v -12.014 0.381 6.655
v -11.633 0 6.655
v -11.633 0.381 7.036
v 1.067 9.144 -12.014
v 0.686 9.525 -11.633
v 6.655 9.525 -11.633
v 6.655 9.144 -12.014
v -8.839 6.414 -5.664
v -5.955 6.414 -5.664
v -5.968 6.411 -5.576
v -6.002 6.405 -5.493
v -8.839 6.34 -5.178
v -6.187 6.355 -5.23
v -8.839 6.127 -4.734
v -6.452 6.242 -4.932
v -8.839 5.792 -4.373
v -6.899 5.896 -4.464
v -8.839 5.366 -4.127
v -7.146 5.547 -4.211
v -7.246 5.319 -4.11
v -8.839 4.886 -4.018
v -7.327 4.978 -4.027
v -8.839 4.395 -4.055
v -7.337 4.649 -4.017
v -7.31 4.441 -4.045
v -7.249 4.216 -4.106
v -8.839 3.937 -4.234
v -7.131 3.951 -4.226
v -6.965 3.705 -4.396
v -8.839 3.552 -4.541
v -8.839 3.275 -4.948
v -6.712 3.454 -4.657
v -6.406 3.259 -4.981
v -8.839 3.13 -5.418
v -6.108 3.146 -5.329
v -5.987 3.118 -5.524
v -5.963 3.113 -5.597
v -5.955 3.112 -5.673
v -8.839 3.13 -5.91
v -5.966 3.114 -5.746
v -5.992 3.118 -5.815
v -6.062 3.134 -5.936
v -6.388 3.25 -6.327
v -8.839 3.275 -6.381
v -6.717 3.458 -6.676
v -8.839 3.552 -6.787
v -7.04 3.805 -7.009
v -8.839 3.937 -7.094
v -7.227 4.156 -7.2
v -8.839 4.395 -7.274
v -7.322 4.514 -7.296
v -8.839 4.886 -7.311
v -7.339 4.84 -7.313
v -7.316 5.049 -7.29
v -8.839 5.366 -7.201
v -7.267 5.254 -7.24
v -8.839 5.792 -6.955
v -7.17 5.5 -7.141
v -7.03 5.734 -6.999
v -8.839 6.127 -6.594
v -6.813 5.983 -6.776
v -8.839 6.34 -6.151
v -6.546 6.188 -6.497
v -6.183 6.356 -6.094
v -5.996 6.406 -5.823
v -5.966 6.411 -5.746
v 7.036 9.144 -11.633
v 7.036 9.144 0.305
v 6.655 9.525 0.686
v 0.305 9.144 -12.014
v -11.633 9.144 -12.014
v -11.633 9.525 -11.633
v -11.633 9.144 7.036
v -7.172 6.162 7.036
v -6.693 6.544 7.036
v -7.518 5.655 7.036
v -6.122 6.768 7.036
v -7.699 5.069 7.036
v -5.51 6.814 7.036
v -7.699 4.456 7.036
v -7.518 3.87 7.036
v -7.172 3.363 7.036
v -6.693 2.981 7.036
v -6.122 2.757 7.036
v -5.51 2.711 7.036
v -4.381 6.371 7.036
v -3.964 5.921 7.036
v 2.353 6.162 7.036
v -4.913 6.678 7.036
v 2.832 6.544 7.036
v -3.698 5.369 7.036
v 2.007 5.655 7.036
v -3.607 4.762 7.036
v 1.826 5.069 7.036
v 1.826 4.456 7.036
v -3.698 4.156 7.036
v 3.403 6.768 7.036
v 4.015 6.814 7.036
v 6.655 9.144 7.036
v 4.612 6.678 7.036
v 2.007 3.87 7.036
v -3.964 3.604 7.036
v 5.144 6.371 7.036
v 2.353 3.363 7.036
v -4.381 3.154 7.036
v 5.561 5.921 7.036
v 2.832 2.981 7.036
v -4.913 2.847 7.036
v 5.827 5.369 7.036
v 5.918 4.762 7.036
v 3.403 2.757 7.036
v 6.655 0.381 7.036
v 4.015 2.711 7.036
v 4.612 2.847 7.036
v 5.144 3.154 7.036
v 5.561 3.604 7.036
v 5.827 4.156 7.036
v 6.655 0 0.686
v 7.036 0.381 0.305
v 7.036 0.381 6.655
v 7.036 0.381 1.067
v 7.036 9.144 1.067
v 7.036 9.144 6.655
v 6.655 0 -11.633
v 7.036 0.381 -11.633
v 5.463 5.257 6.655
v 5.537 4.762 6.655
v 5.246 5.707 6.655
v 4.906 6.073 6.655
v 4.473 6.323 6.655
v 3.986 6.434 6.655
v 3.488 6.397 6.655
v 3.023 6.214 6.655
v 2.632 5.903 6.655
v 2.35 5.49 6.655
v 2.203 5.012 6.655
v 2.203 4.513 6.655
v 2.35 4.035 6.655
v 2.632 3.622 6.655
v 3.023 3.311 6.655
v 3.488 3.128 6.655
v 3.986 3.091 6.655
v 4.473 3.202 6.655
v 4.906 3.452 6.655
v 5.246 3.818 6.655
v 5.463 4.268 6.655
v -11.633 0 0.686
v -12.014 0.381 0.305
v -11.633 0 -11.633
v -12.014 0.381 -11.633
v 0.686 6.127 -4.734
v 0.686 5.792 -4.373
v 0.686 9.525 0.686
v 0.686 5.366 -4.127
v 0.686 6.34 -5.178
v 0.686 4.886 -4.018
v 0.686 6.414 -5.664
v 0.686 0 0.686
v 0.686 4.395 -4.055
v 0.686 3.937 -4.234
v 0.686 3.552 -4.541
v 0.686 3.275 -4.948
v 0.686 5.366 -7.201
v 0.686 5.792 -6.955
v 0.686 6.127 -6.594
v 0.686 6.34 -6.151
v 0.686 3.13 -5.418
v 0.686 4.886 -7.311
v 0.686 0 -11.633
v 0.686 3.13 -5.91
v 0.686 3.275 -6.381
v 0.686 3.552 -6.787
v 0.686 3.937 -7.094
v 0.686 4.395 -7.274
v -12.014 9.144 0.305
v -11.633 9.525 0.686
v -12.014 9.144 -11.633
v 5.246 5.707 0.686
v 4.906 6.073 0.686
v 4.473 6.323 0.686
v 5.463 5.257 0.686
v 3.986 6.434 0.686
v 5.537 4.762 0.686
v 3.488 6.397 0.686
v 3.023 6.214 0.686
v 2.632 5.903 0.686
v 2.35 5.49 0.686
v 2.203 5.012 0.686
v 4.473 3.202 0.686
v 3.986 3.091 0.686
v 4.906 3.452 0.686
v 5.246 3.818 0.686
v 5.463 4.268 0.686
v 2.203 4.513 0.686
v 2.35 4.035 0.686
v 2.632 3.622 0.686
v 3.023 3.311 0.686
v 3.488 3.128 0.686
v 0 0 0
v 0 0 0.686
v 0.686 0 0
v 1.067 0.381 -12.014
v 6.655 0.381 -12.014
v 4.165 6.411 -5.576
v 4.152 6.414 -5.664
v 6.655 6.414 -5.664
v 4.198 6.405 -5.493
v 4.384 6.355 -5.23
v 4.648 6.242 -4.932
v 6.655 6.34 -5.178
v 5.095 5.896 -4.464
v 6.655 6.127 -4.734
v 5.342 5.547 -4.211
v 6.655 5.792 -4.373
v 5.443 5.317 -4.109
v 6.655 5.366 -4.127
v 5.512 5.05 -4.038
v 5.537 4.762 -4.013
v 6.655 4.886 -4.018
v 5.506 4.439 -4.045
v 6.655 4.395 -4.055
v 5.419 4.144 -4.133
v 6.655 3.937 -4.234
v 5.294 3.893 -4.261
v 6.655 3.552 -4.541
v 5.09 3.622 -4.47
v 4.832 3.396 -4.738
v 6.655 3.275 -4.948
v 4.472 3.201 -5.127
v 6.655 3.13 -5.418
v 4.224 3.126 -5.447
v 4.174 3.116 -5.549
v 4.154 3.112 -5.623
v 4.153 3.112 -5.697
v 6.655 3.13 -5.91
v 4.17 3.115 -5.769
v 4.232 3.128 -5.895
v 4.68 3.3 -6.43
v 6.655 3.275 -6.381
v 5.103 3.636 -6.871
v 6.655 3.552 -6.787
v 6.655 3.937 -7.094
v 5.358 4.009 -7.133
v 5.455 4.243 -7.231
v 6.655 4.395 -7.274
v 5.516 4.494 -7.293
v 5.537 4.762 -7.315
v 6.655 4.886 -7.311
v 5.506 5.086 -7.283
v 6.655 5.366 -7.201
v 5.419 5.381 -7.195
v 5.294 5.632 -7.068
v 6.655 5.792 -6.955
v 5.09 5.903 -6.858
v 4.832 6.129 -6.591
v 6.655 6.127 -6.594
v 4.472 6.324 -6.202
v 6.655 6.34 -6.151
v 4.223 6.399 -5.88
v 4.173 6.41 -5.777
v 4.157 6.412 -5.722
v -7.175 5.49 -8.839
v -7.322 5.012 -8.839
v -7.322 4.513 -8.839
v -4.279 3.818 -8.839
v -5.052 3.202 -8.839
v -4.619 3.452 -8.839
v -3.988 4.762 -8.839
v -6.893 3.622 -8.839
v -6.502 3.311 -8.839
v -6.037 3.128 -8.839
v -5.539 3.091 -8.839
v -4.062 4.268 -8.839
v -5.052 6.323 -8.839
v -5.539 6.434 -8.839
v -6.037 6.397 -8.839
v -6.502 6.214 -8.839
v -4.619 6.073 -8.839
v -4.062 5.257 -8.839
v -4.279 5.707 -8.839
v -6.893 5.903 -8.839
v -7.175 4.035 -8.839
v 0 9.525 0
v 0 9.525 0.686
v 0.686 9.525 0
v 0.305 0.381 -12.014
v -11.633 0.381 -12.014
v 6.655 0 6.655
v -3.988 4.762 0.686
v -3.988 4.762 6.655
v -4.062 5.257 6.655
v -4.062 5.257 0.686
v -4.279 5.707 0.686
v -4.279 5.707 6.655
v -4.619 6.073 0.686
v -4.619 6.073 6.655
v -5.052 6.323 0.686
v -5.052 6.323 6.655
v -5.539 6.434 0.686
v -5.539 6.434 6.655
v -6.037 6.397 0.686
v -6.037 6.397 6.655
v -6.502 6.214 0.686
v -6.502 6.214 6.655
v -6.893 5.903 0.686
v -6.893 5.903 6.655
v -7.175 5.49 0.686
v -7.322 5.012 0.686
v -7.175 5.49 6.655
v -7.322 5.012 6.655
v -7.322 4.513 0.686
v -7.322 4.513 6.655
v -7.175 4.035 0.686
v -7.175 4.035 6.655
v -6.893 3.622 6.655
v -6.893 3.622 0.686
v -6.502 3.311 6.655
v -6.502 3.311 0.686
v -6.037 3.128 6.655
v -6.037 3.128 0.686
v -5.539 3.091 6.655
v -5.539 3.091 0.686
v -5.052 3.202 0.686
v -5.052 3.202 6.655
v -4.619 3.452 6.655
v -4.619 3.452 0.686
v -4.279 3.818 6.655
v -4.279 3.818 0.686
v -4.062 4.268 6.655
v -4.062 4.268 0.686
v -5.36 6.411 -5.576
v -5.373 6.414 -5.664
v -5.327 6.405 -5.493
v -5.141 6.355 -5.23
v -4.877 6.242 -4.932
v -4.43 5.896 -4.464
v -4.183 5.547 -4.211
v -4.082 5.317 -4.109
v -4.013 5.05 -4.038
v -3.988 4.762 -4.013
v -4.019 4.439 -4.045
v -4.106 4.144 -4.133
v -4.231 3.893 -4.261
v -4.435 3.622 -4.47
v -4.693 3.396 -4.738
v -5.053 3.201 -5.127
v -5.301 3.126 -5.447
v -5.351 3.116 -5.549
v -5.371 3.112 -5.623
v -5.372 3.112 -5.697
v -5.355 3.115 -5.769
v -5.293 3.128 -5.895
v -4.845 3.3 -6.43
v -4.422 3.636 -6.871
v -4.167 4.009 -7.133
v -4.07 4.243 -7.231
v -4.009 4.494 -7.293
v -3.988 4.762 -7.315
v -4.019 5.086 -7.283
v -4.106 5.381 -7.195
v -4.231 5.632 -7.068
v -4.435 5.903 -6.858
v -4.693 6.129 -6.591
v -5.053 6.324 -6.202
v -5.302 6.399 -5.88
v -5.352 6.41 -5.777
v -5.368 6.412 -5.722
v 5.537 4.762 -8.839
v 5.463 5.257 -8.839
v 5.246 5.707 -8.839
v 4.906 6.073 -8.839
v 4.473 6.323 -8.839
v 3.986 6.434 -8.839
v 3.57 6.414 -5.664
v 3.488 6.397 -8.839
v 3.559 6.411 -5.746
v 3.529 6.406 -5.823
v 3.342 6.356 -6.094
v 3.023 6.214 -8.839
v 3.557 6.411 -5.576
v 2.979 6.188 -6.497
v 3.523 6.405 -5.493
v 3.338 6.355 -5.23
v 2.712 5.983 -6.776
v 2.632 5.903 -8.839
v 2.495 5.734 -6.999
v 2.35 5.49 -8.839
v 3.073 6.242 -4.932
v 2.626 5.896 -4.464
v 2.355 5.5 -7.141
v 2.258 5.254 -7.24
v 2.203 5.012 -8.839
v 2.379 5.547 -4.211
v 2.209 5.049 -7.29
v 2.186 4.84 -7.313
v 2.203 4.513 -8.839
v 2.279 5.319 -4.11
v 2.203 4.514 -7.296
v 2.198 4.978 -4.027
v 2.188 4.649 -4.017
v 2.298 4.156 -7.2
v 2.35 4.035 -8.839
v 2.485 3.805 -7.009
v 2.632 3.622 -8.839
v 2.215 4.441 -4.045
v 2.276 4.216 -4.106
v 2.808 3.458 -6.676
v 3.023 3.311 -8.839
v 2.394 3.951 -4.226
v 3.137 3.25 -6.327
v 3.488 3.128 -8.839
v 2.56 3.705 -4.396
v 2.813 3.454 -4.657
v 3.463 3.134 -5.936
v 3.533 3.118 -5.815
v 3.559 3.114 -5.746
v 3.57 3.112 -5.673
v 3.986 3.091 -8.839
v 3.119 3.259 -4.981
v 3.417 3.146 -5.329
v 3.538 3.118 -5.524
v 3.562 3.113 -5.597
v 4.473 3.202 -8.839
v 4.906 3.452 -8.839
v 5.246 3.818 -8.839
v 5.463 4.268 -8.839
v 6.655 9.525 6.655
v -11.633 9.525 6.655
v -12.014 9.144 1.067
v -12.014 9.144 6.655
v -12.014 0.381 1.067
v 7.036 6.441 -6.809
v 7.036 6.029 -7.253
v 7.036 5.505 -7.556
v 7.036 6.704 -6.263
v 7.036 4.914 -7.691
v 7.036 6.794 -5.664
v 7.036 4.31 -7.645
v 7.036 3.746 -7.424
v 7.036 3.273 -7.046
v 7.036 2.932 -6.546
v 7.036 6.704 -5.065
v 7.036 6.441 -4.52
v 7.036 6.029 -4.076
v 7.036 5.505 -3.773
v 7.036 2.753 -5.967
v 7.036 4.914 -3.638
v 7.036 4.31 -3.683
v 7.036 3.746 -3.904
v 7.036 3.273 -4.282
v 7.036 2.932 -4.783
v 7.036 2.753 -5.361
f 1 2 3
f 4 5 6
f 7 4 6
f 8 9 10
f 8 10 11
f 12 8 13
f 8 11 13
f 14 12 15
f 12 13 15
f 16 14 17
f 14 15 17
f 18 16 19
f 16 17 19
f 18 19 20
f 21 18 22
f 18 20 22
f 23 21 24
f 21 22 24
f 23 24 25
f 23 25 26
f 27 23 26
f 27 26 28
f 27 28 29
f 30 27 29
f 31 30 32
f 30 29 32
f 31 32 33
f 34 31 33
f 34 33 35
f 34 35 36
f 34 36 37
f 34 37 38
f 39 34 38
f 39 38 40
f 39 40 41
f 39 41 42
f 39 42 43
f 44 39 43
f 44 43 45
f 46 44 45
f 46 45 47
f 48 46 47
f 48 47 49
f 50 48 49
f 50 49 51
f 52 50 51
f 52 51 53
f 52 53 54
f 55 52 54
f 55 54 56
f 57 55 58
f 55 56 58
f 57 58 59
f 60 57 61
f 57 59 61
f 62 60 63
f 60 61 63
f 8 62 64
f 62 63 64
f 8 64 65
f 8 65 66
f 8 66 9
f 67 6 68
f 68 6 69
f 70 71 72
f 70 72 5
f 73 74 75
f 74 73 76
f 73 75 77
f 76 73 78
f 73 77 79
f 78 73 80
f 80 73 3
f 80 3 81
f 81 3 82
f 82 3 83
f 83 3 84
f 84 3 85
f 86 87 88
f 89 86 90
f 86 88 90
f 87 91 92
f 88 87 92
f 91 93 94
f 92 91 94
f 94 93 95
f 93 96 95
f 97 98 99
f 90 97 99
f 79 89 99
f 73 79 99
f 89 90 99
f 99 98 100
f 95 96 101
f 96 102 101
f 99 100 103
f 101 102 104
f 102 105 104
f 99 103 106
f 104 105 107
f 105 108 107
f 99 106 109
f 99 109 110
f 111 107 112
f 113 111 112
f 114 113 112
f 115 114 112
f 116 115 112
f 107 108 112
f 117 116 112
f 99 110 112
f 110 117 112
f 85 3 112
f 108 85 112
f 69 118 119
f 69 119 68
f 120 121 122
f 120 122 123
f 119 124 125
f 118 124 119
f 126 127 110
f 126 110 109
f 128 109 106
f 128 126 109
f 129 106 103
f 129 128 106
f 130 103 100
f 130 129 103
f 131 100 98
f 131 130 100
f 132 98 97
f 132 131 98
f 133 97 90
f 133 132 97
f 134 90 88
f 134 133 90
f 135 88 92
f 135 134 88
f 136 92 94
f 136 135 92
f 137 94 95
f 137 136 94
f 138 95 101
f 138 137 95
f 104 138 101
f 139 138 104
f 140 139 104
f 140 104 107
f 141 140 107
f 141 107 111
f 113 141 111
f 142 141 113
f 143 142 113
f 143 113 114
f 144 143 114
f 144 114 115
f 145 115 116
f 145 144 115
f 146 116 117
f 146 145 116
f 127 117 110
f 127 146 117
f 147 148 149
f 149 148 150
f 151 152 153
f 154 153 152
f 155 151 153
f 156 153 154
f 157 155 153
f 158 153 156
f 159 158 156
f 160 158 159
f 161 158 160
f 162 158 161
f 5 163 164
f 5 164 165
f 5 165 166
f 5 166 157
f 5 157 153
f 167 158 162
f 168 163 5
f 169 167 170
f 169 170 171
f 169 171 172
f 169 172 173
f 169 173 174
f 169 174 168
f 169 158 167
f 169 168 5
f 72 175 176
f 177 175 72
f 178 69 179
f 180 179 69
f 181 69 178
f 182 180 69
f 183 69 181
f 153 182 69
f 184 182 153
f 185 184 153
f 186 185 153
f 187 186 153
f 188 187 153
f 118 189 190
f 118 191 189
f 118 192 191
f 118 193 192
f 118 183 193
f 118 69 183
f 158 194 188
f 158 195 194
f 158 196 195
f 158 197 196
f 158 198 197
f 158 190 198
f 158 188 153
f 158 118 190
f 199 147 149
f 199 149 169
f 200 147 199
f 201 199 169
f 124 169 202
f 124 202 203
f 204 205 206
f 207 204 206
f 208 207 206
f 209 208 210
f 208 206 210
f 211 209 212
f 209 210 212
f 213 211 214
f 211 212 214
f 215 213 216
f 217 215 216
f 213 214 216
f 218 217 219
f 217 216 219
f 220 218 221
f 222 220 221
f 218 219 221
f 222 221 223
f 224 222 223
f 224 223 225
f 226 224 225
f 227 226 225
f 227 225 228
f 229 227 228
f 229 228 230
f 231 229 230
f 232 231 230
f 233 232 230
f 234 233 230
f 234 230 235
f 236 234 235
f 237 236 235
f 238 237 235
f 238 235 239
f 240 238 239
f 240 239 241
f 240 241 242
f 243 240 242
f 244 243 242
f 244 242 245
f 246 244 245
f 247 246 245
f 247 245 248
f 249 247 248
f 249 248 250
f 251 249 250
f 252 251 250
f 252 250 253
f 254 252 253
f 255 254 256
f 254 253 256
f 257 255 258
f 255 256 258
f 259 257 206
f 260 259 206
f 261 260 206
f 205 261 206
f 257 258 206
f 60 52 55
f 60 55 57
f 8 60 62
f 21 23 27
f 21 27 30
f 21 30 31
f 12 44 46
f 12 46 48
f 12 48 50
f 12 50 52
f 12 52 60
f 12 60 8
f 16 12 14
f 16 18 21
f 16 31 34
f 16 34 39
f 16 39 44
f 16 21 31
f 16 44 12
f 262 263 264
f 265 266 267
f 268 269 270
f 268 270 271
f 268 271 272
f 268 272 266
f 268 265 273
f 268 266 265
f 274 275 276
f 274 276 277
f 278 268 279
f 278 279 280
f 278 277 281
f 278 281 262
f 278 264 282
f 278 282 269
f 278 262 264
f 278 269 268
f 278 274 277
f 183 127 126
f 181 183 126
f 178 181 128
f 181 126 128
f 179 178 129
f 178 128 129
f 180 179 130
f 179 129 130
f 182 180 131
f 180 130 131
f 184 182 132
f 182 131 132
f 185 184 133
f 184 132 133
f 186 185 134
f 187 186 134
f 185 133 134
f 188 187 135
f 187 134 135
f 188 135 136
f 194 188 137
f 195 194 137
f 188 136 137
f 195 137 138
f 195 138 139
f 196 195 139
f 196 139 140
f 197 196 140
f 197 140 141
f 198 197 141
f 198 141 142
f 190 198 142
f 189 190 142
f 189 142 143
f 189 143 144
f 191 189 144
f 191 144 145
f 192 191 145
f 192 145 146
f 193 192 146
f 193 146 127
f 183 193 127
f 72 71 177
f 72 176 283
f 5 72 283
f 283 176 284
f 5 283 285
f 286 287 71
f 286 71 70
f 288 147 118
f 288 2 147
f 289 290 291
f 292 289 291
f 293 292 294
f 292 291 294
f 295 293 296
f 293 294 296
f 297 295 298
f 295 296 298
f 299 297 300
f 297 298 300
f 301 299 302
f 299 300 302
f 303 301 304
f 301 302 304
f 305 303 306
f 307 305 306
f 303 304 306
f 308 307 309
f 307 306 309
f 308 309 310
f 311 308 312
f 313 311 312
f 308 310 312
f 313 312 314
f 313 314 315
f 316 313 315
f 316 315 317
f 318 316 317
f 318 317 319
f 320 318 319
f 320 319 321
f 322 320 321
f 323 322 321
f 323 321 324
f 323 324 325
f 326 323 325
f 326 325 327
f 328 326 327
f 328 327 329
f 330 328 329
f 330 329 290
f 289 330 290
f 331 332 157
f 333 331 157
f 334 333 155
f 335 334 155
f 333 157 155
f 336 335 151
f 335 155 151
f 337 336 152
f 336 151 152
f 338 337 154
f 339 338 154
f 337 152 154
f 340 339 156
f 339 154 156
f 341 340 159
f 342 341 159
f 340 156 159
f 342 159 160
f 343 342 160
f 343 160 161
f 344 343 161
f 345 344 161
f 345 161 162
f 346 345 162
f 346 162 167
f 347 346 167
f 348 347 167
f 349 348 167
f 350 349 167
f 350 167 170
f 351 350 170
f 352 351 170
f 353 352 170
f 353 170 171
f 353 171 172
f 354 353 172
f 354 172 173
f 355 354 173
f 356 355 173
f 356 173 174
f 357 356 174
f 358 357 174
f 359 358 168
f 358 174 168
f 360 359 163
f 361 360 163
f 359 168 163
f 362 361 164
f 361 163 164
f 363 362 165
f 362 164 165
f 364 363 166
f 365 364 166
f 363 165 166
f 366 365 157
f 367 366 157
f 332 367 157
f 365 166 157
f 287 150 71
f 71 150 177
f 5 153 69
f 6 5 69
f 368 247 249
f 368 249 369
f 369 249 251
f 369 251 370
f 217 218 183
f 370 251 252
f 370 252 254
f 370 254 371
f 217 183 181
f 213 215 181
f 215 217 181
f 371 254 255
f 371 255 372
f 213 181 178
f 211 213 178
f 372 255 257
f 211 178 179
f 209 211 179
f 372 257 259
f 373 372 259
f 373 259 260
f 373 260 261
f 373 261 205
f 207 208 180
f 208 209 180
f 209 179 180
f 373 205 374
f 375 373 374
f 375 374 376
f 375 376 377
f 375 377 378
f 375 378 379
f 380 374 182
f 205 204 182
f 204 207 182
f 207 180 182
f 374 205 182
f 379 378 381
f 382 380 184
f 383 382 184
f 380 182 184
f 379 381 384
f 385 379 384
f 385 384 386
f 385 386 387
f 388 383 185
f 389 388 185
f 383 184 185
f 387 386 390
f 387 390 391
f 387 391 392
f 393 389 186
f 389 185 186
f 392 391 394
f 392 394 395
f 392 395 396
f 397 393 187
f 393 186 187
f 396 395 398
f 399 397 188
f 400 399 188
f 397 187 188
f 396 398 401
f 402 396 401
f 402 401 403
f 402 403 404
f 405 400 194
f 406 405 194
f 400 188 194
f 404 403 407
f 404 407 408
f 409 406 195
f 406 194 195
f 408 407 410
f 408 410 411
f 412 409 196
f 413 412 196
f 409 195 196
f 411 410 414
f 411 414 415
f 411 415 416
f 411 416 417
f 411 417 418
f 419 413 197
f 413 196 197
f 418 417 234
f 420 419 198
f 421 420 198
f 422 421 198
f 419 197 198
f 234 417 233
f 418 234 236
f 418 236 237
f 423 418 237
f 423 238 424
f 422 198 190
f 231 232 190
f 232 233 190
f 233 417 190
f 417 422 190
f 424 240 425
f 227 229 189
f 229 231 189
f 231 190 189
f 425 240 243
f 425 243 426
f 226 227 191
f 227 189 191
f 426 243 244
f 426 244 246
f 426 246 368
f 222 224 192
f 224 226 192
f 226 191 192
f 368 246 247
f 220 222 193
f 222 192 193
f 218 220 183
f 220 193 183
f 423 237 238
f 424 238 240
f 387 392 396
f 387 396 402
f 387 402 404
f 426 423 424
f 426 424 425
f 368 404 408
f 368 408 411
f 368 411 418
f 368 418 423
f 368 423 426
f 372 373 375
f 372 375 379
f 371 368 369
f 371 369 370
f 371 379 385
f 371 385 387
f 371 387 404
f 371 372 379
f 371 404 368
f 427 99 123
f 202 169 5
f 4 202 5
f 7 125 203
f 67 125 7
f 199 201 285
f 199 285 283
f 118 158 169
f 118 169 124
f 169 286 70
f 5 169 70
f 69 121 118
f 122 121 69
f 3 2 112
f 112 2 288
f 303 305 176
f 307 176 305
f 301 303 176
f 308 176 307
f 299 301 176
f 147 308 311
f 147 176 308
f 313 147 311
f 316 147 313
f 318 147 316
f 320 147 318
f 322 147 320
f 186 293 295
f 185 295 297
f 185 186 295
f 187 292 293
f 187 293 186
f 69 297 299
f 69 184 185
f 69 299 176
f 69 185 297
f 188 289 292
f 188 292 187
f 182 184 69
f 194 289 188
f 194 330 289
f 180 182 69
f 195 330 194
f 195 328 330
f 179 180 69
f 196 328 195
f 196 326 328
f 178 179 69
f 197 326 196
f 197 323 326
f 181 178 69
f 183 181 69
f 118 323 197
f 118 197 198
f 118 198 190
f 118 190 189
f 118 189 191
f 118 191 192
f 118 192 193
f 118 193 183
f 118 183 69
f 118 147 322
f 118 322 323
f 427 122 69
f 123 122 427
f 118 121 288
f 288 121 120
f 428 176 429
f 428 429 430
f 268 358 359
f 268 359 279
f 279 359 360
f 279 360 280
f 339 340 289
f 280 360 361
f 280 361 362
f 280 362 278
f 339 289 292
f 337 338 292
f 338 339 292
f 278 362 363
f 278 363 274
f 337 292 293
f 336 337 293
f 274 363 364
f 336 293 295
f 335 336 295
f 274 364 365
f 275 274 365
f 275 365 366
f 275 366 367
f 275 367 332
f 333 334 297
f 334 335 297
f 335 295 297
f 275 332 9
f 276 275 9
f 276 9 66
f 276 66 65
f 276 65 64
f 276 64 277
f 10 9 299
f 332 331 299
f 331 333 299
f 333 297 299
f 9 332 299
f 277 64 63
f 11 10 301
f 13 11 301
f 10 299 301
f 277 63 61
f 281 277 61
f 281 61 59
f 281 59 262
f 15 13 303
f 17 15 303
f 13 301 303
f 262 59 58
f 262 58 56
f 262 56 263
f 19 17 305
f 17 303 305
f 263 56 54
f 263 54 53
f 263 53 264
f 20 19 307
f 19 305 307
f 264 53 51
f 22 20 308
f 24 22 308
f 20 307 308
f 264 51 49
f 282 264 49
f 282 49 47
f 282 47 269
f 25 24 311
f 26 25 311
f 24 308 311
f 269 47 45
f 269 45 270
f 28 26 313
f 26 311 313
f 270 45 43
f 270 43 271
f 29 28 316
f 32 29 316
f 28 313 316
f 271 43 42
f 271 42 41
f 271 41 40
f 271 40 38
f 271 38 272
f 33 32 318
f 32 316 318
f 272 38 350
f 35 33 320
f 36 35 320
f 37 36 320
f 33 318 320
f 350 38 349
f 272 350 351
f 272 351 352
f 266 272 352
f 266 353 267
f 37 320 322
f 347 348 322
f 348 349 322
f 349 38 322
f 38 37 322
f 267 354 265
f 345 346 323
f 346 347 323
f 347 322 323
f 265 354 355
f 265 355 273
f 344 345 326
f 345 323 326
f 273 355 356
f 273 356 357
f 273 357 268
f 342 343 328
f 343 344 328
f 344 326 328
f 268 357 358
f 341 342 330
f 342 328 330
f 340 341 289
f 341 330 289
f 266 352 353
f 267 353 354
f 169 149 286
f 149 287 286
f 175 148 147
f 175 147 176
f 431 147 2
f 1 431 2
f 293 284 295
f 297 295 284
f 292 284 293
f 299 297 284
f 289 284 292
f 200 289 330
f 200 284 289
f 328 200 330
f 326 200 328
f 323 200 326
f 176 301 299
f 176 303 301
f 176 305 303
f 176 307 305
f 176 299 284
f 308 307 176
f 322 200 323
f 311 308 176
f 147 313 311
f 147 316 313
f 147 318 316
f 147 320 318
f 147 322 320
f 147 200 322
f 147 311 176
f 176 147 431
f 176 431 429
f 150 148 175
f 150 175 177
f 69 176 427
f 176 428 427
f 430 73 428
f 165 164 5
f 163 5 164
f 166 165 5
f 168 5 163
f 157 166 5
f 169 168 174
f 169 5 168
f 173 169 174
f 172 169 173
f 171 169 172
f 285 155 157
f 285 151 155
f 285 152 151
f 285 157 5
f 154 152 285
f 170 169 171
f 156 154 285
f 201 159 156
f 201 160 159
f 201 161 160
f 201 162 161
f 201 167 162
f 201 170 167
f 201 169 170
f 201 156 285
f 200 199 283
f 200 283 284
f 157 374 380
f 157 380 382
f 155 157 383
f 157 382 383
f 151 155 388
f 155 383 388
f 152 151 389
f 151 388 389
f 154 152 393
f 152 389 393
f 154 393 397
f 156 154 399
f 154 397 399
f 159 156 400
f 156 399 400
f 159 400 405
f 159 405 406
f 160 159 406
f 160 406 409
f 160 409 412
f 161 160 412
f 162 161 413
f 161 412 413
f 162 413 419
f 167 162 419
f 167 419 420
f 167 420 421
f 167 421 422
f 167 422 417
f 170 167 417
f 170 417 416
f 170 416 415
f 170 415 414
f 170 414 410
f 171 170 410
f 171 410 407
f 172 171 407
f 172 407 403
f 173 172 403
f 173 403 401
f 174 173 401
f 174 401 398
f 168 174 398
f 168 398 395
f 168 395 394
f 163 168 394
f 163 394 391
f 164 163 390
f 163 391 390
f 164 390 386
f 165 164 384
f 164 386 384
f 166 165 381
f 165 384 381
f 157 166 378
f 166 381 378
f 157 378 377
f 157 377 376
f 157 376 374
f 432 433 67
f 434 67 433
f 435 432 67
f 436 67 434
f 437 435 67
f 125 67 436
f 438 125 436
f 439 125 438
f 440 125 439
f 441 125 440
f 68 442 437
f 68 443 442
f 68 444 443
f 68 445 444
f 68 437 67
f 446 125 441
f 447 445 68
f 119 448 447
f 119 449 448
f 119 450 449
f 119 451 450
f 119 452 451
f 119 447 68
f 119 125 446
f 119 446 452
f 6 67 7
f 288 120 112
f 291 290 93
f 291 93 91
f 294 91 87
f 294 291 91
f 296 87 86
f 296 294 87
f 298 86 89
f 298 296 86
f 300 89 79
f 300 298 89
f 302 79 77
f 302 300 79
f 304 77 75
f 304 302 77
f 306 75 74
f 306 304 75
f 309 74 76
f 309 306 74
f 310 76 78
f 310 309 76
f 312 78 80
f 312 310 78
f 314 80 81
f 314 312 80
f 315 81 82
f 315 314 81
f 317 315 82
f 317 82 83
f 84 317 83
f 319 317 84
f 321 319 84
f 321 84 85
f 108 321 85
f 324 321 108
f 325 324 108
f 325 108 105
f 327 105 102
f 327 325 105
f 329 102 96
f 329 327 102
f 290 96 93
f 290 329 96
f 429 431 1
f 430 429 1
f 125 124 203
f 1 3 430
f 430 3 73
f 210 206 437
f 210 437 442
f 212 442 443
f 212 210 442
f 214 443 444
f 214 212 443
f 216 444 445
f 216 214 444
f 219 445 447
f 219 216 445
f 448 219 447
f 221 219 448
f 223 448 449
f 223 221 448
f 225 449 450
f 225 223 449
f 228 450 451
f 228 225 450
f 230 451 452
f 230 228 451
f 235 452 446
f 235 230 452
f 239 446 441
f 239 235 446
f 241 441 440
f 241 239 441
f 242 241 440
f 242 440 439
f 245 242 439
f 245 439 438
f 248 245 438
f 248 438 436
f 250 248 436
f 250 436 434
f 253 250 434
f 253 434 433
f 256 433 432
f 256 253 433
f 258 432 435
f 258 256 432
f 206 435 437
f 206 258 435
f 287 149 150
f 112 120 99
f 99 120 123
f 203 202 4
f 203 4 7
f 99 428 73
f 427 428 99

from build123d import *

# Parameters (mm, degrees)
F1_DEPTH   = 9.525
F3_DEPTH   = 9.525
F4_W       = 19.05
F4_H       = 6.35
F5_DEPTH   = 9.525
F6_R       = 1.651
F7_DEPTH   = 15.875
F8_R       = 1.6764
F9_DEPTH   = 15.875
F10_SIZE   = 0.381
F10_2_SIZE = 0.381
F10_3_SIZE = 0.381


with BuildPart() as f1:
    # F0 (on Front) → F1 (new body)
    with BuildSketch(Plane.XZ):
        Polygon((0.6858, 0), (0, 0), (0, 0.6858), (-12.0142, 0.6858), (-12.0142, -12.0142), (0.6858, -12.0142), align=None)
    extrude(amount=-F1_DEPTH)


with BuildPart() as f3:
    # F2 (on Front) → F3 (new body)
    with BuildSketch(Plane.XZ):
        Polygon((0.6858, 0), (0.6858, -12.0142), (7.0358, -12.0142), (7.0358, 0.6858), (0.6858, 0.6858), align=None)
    extrude(amount=-F3_DEPTH)


with BuildPart() as f5:
    # F4 (on Front) → F5 (new body)
    with BuildSketch(Plane.XZ):
        with Locations((-2.4892, 3.8608)):
            Rectangle(F4_W, F4_H)
    extrude(amount=-F5_DEPTH)


with BuildPart() as f7_tool:
    # F6 (on face) → F7 (new body)
    with BuildSketch(Plane.YZ.offset(7.0358)):
        with Locations((4.7625, -5.6642)):
            Circle(F6_R)
    extrude(amount=-F7_DEPTH)


with BuildPart() as f1_1:
    add(f1.part)

    # F7: cut by f7_tool
    add(f7_tool.part, mode=Mode.SUBTRACT)


with BuildPart() as f3_1:
    add(f3.part)

    # F7: cut by f7_tool
    add(f7_tool.part, mode=Mode.SUBTRACT)


with BuildPart() as f9_tool:
    # F8 (on face) → F9 (new body)
    with BuildSketch(Plane.XY.offset(7.0358)):
        with Locations((-5.6642, 4.7625)):
            Circle(F8_R)
        with Locations((3.8608, 4.7625)):
            Circle(F8_R)
    extrude(amount=-F9_DEPTH)


with BuildPart() as f1_2:
    add(f1_1.part)

    # F9: cut by f9_tool
    add(f9_tool.part, mode=Mode.SUBTRACT)

    # F10#3
    f10_3_edges = [f1_2.edges().sort_by_distance(p)[0] for p in [
        (-5.6642, 0, -12.0142),
        (-12.0142, 0, -5.6642),
        (0.6858, 4.7625, -12.0142),
        (-12.0142, 4.7625, -12.0142),
        (-5.6642, 9.525, -12.0142),
        (-12.0142, 9.525, -5.6642),
        (-12.0142, 4.7625, 0.6858),
    ]]
    chamfer(f10_3_edges, length=F10_3_SIZE)


with BuildPart() as f3_2:
    add(f3_1.part)

    # F9: cut by f9_tool
    add(f9_tool.part, mode=Mode.SUBTRACT)

    # F10#2
    f10_2_edges = [f3_2.edges().sort_by_distance(p)[0] for p in [
        (7.0358, 0, -5.6642),
        (3.8608, 0, -12.0142),
        (7.0358, 4.7625, 0.6858),
        (7.0358, 4.7625, -12.0142),
        (7.0358, 9.525, -5.6642),
        (7.0358, 3.1115, -5.6642),
        (0.6858, 4.7625, -12.0142),
        (3.8608, 9.525, -12.0142),
    ]]
    chamfer(f10_2_edges, length=F10_2_SIZE)


with BuildPart() as f5_1:
    add(f5.part)

    # F9: cut by f9_tool
    add(f9_tool.part, mode=Mode.SUBTRACT)

    # F10
    f10_edges = [f5_1.edges().sort_by_distance(p)[0] for p in [
        (7.0358, 0, 3.8608),
        (-12.0142, 0, 3.8608),
        (7.0358, 4.7625, 7.0358),
        (-2.4892, 0, 7.0358),
        (-2.4892, 9.525, 7.0358),
        (-12.0142, 4.7625, 7.0358),
        (2.1844, 4.7625, 7.0358),
        (-7.3406, 4.7625, 7.0358),
        (7.0358, 4.7625, 0.6858),
        (7.0358, 9.525, 3.8608),
        (-12.0142, 4.7625, 0.6858),
        (-12.0142, 9.525, 3.8608),
    ]]
    chamfer(f10_edges, length=F10_SIZE)


solid = Compound([f1_2.part, f3_2.part, f5_1.part])
